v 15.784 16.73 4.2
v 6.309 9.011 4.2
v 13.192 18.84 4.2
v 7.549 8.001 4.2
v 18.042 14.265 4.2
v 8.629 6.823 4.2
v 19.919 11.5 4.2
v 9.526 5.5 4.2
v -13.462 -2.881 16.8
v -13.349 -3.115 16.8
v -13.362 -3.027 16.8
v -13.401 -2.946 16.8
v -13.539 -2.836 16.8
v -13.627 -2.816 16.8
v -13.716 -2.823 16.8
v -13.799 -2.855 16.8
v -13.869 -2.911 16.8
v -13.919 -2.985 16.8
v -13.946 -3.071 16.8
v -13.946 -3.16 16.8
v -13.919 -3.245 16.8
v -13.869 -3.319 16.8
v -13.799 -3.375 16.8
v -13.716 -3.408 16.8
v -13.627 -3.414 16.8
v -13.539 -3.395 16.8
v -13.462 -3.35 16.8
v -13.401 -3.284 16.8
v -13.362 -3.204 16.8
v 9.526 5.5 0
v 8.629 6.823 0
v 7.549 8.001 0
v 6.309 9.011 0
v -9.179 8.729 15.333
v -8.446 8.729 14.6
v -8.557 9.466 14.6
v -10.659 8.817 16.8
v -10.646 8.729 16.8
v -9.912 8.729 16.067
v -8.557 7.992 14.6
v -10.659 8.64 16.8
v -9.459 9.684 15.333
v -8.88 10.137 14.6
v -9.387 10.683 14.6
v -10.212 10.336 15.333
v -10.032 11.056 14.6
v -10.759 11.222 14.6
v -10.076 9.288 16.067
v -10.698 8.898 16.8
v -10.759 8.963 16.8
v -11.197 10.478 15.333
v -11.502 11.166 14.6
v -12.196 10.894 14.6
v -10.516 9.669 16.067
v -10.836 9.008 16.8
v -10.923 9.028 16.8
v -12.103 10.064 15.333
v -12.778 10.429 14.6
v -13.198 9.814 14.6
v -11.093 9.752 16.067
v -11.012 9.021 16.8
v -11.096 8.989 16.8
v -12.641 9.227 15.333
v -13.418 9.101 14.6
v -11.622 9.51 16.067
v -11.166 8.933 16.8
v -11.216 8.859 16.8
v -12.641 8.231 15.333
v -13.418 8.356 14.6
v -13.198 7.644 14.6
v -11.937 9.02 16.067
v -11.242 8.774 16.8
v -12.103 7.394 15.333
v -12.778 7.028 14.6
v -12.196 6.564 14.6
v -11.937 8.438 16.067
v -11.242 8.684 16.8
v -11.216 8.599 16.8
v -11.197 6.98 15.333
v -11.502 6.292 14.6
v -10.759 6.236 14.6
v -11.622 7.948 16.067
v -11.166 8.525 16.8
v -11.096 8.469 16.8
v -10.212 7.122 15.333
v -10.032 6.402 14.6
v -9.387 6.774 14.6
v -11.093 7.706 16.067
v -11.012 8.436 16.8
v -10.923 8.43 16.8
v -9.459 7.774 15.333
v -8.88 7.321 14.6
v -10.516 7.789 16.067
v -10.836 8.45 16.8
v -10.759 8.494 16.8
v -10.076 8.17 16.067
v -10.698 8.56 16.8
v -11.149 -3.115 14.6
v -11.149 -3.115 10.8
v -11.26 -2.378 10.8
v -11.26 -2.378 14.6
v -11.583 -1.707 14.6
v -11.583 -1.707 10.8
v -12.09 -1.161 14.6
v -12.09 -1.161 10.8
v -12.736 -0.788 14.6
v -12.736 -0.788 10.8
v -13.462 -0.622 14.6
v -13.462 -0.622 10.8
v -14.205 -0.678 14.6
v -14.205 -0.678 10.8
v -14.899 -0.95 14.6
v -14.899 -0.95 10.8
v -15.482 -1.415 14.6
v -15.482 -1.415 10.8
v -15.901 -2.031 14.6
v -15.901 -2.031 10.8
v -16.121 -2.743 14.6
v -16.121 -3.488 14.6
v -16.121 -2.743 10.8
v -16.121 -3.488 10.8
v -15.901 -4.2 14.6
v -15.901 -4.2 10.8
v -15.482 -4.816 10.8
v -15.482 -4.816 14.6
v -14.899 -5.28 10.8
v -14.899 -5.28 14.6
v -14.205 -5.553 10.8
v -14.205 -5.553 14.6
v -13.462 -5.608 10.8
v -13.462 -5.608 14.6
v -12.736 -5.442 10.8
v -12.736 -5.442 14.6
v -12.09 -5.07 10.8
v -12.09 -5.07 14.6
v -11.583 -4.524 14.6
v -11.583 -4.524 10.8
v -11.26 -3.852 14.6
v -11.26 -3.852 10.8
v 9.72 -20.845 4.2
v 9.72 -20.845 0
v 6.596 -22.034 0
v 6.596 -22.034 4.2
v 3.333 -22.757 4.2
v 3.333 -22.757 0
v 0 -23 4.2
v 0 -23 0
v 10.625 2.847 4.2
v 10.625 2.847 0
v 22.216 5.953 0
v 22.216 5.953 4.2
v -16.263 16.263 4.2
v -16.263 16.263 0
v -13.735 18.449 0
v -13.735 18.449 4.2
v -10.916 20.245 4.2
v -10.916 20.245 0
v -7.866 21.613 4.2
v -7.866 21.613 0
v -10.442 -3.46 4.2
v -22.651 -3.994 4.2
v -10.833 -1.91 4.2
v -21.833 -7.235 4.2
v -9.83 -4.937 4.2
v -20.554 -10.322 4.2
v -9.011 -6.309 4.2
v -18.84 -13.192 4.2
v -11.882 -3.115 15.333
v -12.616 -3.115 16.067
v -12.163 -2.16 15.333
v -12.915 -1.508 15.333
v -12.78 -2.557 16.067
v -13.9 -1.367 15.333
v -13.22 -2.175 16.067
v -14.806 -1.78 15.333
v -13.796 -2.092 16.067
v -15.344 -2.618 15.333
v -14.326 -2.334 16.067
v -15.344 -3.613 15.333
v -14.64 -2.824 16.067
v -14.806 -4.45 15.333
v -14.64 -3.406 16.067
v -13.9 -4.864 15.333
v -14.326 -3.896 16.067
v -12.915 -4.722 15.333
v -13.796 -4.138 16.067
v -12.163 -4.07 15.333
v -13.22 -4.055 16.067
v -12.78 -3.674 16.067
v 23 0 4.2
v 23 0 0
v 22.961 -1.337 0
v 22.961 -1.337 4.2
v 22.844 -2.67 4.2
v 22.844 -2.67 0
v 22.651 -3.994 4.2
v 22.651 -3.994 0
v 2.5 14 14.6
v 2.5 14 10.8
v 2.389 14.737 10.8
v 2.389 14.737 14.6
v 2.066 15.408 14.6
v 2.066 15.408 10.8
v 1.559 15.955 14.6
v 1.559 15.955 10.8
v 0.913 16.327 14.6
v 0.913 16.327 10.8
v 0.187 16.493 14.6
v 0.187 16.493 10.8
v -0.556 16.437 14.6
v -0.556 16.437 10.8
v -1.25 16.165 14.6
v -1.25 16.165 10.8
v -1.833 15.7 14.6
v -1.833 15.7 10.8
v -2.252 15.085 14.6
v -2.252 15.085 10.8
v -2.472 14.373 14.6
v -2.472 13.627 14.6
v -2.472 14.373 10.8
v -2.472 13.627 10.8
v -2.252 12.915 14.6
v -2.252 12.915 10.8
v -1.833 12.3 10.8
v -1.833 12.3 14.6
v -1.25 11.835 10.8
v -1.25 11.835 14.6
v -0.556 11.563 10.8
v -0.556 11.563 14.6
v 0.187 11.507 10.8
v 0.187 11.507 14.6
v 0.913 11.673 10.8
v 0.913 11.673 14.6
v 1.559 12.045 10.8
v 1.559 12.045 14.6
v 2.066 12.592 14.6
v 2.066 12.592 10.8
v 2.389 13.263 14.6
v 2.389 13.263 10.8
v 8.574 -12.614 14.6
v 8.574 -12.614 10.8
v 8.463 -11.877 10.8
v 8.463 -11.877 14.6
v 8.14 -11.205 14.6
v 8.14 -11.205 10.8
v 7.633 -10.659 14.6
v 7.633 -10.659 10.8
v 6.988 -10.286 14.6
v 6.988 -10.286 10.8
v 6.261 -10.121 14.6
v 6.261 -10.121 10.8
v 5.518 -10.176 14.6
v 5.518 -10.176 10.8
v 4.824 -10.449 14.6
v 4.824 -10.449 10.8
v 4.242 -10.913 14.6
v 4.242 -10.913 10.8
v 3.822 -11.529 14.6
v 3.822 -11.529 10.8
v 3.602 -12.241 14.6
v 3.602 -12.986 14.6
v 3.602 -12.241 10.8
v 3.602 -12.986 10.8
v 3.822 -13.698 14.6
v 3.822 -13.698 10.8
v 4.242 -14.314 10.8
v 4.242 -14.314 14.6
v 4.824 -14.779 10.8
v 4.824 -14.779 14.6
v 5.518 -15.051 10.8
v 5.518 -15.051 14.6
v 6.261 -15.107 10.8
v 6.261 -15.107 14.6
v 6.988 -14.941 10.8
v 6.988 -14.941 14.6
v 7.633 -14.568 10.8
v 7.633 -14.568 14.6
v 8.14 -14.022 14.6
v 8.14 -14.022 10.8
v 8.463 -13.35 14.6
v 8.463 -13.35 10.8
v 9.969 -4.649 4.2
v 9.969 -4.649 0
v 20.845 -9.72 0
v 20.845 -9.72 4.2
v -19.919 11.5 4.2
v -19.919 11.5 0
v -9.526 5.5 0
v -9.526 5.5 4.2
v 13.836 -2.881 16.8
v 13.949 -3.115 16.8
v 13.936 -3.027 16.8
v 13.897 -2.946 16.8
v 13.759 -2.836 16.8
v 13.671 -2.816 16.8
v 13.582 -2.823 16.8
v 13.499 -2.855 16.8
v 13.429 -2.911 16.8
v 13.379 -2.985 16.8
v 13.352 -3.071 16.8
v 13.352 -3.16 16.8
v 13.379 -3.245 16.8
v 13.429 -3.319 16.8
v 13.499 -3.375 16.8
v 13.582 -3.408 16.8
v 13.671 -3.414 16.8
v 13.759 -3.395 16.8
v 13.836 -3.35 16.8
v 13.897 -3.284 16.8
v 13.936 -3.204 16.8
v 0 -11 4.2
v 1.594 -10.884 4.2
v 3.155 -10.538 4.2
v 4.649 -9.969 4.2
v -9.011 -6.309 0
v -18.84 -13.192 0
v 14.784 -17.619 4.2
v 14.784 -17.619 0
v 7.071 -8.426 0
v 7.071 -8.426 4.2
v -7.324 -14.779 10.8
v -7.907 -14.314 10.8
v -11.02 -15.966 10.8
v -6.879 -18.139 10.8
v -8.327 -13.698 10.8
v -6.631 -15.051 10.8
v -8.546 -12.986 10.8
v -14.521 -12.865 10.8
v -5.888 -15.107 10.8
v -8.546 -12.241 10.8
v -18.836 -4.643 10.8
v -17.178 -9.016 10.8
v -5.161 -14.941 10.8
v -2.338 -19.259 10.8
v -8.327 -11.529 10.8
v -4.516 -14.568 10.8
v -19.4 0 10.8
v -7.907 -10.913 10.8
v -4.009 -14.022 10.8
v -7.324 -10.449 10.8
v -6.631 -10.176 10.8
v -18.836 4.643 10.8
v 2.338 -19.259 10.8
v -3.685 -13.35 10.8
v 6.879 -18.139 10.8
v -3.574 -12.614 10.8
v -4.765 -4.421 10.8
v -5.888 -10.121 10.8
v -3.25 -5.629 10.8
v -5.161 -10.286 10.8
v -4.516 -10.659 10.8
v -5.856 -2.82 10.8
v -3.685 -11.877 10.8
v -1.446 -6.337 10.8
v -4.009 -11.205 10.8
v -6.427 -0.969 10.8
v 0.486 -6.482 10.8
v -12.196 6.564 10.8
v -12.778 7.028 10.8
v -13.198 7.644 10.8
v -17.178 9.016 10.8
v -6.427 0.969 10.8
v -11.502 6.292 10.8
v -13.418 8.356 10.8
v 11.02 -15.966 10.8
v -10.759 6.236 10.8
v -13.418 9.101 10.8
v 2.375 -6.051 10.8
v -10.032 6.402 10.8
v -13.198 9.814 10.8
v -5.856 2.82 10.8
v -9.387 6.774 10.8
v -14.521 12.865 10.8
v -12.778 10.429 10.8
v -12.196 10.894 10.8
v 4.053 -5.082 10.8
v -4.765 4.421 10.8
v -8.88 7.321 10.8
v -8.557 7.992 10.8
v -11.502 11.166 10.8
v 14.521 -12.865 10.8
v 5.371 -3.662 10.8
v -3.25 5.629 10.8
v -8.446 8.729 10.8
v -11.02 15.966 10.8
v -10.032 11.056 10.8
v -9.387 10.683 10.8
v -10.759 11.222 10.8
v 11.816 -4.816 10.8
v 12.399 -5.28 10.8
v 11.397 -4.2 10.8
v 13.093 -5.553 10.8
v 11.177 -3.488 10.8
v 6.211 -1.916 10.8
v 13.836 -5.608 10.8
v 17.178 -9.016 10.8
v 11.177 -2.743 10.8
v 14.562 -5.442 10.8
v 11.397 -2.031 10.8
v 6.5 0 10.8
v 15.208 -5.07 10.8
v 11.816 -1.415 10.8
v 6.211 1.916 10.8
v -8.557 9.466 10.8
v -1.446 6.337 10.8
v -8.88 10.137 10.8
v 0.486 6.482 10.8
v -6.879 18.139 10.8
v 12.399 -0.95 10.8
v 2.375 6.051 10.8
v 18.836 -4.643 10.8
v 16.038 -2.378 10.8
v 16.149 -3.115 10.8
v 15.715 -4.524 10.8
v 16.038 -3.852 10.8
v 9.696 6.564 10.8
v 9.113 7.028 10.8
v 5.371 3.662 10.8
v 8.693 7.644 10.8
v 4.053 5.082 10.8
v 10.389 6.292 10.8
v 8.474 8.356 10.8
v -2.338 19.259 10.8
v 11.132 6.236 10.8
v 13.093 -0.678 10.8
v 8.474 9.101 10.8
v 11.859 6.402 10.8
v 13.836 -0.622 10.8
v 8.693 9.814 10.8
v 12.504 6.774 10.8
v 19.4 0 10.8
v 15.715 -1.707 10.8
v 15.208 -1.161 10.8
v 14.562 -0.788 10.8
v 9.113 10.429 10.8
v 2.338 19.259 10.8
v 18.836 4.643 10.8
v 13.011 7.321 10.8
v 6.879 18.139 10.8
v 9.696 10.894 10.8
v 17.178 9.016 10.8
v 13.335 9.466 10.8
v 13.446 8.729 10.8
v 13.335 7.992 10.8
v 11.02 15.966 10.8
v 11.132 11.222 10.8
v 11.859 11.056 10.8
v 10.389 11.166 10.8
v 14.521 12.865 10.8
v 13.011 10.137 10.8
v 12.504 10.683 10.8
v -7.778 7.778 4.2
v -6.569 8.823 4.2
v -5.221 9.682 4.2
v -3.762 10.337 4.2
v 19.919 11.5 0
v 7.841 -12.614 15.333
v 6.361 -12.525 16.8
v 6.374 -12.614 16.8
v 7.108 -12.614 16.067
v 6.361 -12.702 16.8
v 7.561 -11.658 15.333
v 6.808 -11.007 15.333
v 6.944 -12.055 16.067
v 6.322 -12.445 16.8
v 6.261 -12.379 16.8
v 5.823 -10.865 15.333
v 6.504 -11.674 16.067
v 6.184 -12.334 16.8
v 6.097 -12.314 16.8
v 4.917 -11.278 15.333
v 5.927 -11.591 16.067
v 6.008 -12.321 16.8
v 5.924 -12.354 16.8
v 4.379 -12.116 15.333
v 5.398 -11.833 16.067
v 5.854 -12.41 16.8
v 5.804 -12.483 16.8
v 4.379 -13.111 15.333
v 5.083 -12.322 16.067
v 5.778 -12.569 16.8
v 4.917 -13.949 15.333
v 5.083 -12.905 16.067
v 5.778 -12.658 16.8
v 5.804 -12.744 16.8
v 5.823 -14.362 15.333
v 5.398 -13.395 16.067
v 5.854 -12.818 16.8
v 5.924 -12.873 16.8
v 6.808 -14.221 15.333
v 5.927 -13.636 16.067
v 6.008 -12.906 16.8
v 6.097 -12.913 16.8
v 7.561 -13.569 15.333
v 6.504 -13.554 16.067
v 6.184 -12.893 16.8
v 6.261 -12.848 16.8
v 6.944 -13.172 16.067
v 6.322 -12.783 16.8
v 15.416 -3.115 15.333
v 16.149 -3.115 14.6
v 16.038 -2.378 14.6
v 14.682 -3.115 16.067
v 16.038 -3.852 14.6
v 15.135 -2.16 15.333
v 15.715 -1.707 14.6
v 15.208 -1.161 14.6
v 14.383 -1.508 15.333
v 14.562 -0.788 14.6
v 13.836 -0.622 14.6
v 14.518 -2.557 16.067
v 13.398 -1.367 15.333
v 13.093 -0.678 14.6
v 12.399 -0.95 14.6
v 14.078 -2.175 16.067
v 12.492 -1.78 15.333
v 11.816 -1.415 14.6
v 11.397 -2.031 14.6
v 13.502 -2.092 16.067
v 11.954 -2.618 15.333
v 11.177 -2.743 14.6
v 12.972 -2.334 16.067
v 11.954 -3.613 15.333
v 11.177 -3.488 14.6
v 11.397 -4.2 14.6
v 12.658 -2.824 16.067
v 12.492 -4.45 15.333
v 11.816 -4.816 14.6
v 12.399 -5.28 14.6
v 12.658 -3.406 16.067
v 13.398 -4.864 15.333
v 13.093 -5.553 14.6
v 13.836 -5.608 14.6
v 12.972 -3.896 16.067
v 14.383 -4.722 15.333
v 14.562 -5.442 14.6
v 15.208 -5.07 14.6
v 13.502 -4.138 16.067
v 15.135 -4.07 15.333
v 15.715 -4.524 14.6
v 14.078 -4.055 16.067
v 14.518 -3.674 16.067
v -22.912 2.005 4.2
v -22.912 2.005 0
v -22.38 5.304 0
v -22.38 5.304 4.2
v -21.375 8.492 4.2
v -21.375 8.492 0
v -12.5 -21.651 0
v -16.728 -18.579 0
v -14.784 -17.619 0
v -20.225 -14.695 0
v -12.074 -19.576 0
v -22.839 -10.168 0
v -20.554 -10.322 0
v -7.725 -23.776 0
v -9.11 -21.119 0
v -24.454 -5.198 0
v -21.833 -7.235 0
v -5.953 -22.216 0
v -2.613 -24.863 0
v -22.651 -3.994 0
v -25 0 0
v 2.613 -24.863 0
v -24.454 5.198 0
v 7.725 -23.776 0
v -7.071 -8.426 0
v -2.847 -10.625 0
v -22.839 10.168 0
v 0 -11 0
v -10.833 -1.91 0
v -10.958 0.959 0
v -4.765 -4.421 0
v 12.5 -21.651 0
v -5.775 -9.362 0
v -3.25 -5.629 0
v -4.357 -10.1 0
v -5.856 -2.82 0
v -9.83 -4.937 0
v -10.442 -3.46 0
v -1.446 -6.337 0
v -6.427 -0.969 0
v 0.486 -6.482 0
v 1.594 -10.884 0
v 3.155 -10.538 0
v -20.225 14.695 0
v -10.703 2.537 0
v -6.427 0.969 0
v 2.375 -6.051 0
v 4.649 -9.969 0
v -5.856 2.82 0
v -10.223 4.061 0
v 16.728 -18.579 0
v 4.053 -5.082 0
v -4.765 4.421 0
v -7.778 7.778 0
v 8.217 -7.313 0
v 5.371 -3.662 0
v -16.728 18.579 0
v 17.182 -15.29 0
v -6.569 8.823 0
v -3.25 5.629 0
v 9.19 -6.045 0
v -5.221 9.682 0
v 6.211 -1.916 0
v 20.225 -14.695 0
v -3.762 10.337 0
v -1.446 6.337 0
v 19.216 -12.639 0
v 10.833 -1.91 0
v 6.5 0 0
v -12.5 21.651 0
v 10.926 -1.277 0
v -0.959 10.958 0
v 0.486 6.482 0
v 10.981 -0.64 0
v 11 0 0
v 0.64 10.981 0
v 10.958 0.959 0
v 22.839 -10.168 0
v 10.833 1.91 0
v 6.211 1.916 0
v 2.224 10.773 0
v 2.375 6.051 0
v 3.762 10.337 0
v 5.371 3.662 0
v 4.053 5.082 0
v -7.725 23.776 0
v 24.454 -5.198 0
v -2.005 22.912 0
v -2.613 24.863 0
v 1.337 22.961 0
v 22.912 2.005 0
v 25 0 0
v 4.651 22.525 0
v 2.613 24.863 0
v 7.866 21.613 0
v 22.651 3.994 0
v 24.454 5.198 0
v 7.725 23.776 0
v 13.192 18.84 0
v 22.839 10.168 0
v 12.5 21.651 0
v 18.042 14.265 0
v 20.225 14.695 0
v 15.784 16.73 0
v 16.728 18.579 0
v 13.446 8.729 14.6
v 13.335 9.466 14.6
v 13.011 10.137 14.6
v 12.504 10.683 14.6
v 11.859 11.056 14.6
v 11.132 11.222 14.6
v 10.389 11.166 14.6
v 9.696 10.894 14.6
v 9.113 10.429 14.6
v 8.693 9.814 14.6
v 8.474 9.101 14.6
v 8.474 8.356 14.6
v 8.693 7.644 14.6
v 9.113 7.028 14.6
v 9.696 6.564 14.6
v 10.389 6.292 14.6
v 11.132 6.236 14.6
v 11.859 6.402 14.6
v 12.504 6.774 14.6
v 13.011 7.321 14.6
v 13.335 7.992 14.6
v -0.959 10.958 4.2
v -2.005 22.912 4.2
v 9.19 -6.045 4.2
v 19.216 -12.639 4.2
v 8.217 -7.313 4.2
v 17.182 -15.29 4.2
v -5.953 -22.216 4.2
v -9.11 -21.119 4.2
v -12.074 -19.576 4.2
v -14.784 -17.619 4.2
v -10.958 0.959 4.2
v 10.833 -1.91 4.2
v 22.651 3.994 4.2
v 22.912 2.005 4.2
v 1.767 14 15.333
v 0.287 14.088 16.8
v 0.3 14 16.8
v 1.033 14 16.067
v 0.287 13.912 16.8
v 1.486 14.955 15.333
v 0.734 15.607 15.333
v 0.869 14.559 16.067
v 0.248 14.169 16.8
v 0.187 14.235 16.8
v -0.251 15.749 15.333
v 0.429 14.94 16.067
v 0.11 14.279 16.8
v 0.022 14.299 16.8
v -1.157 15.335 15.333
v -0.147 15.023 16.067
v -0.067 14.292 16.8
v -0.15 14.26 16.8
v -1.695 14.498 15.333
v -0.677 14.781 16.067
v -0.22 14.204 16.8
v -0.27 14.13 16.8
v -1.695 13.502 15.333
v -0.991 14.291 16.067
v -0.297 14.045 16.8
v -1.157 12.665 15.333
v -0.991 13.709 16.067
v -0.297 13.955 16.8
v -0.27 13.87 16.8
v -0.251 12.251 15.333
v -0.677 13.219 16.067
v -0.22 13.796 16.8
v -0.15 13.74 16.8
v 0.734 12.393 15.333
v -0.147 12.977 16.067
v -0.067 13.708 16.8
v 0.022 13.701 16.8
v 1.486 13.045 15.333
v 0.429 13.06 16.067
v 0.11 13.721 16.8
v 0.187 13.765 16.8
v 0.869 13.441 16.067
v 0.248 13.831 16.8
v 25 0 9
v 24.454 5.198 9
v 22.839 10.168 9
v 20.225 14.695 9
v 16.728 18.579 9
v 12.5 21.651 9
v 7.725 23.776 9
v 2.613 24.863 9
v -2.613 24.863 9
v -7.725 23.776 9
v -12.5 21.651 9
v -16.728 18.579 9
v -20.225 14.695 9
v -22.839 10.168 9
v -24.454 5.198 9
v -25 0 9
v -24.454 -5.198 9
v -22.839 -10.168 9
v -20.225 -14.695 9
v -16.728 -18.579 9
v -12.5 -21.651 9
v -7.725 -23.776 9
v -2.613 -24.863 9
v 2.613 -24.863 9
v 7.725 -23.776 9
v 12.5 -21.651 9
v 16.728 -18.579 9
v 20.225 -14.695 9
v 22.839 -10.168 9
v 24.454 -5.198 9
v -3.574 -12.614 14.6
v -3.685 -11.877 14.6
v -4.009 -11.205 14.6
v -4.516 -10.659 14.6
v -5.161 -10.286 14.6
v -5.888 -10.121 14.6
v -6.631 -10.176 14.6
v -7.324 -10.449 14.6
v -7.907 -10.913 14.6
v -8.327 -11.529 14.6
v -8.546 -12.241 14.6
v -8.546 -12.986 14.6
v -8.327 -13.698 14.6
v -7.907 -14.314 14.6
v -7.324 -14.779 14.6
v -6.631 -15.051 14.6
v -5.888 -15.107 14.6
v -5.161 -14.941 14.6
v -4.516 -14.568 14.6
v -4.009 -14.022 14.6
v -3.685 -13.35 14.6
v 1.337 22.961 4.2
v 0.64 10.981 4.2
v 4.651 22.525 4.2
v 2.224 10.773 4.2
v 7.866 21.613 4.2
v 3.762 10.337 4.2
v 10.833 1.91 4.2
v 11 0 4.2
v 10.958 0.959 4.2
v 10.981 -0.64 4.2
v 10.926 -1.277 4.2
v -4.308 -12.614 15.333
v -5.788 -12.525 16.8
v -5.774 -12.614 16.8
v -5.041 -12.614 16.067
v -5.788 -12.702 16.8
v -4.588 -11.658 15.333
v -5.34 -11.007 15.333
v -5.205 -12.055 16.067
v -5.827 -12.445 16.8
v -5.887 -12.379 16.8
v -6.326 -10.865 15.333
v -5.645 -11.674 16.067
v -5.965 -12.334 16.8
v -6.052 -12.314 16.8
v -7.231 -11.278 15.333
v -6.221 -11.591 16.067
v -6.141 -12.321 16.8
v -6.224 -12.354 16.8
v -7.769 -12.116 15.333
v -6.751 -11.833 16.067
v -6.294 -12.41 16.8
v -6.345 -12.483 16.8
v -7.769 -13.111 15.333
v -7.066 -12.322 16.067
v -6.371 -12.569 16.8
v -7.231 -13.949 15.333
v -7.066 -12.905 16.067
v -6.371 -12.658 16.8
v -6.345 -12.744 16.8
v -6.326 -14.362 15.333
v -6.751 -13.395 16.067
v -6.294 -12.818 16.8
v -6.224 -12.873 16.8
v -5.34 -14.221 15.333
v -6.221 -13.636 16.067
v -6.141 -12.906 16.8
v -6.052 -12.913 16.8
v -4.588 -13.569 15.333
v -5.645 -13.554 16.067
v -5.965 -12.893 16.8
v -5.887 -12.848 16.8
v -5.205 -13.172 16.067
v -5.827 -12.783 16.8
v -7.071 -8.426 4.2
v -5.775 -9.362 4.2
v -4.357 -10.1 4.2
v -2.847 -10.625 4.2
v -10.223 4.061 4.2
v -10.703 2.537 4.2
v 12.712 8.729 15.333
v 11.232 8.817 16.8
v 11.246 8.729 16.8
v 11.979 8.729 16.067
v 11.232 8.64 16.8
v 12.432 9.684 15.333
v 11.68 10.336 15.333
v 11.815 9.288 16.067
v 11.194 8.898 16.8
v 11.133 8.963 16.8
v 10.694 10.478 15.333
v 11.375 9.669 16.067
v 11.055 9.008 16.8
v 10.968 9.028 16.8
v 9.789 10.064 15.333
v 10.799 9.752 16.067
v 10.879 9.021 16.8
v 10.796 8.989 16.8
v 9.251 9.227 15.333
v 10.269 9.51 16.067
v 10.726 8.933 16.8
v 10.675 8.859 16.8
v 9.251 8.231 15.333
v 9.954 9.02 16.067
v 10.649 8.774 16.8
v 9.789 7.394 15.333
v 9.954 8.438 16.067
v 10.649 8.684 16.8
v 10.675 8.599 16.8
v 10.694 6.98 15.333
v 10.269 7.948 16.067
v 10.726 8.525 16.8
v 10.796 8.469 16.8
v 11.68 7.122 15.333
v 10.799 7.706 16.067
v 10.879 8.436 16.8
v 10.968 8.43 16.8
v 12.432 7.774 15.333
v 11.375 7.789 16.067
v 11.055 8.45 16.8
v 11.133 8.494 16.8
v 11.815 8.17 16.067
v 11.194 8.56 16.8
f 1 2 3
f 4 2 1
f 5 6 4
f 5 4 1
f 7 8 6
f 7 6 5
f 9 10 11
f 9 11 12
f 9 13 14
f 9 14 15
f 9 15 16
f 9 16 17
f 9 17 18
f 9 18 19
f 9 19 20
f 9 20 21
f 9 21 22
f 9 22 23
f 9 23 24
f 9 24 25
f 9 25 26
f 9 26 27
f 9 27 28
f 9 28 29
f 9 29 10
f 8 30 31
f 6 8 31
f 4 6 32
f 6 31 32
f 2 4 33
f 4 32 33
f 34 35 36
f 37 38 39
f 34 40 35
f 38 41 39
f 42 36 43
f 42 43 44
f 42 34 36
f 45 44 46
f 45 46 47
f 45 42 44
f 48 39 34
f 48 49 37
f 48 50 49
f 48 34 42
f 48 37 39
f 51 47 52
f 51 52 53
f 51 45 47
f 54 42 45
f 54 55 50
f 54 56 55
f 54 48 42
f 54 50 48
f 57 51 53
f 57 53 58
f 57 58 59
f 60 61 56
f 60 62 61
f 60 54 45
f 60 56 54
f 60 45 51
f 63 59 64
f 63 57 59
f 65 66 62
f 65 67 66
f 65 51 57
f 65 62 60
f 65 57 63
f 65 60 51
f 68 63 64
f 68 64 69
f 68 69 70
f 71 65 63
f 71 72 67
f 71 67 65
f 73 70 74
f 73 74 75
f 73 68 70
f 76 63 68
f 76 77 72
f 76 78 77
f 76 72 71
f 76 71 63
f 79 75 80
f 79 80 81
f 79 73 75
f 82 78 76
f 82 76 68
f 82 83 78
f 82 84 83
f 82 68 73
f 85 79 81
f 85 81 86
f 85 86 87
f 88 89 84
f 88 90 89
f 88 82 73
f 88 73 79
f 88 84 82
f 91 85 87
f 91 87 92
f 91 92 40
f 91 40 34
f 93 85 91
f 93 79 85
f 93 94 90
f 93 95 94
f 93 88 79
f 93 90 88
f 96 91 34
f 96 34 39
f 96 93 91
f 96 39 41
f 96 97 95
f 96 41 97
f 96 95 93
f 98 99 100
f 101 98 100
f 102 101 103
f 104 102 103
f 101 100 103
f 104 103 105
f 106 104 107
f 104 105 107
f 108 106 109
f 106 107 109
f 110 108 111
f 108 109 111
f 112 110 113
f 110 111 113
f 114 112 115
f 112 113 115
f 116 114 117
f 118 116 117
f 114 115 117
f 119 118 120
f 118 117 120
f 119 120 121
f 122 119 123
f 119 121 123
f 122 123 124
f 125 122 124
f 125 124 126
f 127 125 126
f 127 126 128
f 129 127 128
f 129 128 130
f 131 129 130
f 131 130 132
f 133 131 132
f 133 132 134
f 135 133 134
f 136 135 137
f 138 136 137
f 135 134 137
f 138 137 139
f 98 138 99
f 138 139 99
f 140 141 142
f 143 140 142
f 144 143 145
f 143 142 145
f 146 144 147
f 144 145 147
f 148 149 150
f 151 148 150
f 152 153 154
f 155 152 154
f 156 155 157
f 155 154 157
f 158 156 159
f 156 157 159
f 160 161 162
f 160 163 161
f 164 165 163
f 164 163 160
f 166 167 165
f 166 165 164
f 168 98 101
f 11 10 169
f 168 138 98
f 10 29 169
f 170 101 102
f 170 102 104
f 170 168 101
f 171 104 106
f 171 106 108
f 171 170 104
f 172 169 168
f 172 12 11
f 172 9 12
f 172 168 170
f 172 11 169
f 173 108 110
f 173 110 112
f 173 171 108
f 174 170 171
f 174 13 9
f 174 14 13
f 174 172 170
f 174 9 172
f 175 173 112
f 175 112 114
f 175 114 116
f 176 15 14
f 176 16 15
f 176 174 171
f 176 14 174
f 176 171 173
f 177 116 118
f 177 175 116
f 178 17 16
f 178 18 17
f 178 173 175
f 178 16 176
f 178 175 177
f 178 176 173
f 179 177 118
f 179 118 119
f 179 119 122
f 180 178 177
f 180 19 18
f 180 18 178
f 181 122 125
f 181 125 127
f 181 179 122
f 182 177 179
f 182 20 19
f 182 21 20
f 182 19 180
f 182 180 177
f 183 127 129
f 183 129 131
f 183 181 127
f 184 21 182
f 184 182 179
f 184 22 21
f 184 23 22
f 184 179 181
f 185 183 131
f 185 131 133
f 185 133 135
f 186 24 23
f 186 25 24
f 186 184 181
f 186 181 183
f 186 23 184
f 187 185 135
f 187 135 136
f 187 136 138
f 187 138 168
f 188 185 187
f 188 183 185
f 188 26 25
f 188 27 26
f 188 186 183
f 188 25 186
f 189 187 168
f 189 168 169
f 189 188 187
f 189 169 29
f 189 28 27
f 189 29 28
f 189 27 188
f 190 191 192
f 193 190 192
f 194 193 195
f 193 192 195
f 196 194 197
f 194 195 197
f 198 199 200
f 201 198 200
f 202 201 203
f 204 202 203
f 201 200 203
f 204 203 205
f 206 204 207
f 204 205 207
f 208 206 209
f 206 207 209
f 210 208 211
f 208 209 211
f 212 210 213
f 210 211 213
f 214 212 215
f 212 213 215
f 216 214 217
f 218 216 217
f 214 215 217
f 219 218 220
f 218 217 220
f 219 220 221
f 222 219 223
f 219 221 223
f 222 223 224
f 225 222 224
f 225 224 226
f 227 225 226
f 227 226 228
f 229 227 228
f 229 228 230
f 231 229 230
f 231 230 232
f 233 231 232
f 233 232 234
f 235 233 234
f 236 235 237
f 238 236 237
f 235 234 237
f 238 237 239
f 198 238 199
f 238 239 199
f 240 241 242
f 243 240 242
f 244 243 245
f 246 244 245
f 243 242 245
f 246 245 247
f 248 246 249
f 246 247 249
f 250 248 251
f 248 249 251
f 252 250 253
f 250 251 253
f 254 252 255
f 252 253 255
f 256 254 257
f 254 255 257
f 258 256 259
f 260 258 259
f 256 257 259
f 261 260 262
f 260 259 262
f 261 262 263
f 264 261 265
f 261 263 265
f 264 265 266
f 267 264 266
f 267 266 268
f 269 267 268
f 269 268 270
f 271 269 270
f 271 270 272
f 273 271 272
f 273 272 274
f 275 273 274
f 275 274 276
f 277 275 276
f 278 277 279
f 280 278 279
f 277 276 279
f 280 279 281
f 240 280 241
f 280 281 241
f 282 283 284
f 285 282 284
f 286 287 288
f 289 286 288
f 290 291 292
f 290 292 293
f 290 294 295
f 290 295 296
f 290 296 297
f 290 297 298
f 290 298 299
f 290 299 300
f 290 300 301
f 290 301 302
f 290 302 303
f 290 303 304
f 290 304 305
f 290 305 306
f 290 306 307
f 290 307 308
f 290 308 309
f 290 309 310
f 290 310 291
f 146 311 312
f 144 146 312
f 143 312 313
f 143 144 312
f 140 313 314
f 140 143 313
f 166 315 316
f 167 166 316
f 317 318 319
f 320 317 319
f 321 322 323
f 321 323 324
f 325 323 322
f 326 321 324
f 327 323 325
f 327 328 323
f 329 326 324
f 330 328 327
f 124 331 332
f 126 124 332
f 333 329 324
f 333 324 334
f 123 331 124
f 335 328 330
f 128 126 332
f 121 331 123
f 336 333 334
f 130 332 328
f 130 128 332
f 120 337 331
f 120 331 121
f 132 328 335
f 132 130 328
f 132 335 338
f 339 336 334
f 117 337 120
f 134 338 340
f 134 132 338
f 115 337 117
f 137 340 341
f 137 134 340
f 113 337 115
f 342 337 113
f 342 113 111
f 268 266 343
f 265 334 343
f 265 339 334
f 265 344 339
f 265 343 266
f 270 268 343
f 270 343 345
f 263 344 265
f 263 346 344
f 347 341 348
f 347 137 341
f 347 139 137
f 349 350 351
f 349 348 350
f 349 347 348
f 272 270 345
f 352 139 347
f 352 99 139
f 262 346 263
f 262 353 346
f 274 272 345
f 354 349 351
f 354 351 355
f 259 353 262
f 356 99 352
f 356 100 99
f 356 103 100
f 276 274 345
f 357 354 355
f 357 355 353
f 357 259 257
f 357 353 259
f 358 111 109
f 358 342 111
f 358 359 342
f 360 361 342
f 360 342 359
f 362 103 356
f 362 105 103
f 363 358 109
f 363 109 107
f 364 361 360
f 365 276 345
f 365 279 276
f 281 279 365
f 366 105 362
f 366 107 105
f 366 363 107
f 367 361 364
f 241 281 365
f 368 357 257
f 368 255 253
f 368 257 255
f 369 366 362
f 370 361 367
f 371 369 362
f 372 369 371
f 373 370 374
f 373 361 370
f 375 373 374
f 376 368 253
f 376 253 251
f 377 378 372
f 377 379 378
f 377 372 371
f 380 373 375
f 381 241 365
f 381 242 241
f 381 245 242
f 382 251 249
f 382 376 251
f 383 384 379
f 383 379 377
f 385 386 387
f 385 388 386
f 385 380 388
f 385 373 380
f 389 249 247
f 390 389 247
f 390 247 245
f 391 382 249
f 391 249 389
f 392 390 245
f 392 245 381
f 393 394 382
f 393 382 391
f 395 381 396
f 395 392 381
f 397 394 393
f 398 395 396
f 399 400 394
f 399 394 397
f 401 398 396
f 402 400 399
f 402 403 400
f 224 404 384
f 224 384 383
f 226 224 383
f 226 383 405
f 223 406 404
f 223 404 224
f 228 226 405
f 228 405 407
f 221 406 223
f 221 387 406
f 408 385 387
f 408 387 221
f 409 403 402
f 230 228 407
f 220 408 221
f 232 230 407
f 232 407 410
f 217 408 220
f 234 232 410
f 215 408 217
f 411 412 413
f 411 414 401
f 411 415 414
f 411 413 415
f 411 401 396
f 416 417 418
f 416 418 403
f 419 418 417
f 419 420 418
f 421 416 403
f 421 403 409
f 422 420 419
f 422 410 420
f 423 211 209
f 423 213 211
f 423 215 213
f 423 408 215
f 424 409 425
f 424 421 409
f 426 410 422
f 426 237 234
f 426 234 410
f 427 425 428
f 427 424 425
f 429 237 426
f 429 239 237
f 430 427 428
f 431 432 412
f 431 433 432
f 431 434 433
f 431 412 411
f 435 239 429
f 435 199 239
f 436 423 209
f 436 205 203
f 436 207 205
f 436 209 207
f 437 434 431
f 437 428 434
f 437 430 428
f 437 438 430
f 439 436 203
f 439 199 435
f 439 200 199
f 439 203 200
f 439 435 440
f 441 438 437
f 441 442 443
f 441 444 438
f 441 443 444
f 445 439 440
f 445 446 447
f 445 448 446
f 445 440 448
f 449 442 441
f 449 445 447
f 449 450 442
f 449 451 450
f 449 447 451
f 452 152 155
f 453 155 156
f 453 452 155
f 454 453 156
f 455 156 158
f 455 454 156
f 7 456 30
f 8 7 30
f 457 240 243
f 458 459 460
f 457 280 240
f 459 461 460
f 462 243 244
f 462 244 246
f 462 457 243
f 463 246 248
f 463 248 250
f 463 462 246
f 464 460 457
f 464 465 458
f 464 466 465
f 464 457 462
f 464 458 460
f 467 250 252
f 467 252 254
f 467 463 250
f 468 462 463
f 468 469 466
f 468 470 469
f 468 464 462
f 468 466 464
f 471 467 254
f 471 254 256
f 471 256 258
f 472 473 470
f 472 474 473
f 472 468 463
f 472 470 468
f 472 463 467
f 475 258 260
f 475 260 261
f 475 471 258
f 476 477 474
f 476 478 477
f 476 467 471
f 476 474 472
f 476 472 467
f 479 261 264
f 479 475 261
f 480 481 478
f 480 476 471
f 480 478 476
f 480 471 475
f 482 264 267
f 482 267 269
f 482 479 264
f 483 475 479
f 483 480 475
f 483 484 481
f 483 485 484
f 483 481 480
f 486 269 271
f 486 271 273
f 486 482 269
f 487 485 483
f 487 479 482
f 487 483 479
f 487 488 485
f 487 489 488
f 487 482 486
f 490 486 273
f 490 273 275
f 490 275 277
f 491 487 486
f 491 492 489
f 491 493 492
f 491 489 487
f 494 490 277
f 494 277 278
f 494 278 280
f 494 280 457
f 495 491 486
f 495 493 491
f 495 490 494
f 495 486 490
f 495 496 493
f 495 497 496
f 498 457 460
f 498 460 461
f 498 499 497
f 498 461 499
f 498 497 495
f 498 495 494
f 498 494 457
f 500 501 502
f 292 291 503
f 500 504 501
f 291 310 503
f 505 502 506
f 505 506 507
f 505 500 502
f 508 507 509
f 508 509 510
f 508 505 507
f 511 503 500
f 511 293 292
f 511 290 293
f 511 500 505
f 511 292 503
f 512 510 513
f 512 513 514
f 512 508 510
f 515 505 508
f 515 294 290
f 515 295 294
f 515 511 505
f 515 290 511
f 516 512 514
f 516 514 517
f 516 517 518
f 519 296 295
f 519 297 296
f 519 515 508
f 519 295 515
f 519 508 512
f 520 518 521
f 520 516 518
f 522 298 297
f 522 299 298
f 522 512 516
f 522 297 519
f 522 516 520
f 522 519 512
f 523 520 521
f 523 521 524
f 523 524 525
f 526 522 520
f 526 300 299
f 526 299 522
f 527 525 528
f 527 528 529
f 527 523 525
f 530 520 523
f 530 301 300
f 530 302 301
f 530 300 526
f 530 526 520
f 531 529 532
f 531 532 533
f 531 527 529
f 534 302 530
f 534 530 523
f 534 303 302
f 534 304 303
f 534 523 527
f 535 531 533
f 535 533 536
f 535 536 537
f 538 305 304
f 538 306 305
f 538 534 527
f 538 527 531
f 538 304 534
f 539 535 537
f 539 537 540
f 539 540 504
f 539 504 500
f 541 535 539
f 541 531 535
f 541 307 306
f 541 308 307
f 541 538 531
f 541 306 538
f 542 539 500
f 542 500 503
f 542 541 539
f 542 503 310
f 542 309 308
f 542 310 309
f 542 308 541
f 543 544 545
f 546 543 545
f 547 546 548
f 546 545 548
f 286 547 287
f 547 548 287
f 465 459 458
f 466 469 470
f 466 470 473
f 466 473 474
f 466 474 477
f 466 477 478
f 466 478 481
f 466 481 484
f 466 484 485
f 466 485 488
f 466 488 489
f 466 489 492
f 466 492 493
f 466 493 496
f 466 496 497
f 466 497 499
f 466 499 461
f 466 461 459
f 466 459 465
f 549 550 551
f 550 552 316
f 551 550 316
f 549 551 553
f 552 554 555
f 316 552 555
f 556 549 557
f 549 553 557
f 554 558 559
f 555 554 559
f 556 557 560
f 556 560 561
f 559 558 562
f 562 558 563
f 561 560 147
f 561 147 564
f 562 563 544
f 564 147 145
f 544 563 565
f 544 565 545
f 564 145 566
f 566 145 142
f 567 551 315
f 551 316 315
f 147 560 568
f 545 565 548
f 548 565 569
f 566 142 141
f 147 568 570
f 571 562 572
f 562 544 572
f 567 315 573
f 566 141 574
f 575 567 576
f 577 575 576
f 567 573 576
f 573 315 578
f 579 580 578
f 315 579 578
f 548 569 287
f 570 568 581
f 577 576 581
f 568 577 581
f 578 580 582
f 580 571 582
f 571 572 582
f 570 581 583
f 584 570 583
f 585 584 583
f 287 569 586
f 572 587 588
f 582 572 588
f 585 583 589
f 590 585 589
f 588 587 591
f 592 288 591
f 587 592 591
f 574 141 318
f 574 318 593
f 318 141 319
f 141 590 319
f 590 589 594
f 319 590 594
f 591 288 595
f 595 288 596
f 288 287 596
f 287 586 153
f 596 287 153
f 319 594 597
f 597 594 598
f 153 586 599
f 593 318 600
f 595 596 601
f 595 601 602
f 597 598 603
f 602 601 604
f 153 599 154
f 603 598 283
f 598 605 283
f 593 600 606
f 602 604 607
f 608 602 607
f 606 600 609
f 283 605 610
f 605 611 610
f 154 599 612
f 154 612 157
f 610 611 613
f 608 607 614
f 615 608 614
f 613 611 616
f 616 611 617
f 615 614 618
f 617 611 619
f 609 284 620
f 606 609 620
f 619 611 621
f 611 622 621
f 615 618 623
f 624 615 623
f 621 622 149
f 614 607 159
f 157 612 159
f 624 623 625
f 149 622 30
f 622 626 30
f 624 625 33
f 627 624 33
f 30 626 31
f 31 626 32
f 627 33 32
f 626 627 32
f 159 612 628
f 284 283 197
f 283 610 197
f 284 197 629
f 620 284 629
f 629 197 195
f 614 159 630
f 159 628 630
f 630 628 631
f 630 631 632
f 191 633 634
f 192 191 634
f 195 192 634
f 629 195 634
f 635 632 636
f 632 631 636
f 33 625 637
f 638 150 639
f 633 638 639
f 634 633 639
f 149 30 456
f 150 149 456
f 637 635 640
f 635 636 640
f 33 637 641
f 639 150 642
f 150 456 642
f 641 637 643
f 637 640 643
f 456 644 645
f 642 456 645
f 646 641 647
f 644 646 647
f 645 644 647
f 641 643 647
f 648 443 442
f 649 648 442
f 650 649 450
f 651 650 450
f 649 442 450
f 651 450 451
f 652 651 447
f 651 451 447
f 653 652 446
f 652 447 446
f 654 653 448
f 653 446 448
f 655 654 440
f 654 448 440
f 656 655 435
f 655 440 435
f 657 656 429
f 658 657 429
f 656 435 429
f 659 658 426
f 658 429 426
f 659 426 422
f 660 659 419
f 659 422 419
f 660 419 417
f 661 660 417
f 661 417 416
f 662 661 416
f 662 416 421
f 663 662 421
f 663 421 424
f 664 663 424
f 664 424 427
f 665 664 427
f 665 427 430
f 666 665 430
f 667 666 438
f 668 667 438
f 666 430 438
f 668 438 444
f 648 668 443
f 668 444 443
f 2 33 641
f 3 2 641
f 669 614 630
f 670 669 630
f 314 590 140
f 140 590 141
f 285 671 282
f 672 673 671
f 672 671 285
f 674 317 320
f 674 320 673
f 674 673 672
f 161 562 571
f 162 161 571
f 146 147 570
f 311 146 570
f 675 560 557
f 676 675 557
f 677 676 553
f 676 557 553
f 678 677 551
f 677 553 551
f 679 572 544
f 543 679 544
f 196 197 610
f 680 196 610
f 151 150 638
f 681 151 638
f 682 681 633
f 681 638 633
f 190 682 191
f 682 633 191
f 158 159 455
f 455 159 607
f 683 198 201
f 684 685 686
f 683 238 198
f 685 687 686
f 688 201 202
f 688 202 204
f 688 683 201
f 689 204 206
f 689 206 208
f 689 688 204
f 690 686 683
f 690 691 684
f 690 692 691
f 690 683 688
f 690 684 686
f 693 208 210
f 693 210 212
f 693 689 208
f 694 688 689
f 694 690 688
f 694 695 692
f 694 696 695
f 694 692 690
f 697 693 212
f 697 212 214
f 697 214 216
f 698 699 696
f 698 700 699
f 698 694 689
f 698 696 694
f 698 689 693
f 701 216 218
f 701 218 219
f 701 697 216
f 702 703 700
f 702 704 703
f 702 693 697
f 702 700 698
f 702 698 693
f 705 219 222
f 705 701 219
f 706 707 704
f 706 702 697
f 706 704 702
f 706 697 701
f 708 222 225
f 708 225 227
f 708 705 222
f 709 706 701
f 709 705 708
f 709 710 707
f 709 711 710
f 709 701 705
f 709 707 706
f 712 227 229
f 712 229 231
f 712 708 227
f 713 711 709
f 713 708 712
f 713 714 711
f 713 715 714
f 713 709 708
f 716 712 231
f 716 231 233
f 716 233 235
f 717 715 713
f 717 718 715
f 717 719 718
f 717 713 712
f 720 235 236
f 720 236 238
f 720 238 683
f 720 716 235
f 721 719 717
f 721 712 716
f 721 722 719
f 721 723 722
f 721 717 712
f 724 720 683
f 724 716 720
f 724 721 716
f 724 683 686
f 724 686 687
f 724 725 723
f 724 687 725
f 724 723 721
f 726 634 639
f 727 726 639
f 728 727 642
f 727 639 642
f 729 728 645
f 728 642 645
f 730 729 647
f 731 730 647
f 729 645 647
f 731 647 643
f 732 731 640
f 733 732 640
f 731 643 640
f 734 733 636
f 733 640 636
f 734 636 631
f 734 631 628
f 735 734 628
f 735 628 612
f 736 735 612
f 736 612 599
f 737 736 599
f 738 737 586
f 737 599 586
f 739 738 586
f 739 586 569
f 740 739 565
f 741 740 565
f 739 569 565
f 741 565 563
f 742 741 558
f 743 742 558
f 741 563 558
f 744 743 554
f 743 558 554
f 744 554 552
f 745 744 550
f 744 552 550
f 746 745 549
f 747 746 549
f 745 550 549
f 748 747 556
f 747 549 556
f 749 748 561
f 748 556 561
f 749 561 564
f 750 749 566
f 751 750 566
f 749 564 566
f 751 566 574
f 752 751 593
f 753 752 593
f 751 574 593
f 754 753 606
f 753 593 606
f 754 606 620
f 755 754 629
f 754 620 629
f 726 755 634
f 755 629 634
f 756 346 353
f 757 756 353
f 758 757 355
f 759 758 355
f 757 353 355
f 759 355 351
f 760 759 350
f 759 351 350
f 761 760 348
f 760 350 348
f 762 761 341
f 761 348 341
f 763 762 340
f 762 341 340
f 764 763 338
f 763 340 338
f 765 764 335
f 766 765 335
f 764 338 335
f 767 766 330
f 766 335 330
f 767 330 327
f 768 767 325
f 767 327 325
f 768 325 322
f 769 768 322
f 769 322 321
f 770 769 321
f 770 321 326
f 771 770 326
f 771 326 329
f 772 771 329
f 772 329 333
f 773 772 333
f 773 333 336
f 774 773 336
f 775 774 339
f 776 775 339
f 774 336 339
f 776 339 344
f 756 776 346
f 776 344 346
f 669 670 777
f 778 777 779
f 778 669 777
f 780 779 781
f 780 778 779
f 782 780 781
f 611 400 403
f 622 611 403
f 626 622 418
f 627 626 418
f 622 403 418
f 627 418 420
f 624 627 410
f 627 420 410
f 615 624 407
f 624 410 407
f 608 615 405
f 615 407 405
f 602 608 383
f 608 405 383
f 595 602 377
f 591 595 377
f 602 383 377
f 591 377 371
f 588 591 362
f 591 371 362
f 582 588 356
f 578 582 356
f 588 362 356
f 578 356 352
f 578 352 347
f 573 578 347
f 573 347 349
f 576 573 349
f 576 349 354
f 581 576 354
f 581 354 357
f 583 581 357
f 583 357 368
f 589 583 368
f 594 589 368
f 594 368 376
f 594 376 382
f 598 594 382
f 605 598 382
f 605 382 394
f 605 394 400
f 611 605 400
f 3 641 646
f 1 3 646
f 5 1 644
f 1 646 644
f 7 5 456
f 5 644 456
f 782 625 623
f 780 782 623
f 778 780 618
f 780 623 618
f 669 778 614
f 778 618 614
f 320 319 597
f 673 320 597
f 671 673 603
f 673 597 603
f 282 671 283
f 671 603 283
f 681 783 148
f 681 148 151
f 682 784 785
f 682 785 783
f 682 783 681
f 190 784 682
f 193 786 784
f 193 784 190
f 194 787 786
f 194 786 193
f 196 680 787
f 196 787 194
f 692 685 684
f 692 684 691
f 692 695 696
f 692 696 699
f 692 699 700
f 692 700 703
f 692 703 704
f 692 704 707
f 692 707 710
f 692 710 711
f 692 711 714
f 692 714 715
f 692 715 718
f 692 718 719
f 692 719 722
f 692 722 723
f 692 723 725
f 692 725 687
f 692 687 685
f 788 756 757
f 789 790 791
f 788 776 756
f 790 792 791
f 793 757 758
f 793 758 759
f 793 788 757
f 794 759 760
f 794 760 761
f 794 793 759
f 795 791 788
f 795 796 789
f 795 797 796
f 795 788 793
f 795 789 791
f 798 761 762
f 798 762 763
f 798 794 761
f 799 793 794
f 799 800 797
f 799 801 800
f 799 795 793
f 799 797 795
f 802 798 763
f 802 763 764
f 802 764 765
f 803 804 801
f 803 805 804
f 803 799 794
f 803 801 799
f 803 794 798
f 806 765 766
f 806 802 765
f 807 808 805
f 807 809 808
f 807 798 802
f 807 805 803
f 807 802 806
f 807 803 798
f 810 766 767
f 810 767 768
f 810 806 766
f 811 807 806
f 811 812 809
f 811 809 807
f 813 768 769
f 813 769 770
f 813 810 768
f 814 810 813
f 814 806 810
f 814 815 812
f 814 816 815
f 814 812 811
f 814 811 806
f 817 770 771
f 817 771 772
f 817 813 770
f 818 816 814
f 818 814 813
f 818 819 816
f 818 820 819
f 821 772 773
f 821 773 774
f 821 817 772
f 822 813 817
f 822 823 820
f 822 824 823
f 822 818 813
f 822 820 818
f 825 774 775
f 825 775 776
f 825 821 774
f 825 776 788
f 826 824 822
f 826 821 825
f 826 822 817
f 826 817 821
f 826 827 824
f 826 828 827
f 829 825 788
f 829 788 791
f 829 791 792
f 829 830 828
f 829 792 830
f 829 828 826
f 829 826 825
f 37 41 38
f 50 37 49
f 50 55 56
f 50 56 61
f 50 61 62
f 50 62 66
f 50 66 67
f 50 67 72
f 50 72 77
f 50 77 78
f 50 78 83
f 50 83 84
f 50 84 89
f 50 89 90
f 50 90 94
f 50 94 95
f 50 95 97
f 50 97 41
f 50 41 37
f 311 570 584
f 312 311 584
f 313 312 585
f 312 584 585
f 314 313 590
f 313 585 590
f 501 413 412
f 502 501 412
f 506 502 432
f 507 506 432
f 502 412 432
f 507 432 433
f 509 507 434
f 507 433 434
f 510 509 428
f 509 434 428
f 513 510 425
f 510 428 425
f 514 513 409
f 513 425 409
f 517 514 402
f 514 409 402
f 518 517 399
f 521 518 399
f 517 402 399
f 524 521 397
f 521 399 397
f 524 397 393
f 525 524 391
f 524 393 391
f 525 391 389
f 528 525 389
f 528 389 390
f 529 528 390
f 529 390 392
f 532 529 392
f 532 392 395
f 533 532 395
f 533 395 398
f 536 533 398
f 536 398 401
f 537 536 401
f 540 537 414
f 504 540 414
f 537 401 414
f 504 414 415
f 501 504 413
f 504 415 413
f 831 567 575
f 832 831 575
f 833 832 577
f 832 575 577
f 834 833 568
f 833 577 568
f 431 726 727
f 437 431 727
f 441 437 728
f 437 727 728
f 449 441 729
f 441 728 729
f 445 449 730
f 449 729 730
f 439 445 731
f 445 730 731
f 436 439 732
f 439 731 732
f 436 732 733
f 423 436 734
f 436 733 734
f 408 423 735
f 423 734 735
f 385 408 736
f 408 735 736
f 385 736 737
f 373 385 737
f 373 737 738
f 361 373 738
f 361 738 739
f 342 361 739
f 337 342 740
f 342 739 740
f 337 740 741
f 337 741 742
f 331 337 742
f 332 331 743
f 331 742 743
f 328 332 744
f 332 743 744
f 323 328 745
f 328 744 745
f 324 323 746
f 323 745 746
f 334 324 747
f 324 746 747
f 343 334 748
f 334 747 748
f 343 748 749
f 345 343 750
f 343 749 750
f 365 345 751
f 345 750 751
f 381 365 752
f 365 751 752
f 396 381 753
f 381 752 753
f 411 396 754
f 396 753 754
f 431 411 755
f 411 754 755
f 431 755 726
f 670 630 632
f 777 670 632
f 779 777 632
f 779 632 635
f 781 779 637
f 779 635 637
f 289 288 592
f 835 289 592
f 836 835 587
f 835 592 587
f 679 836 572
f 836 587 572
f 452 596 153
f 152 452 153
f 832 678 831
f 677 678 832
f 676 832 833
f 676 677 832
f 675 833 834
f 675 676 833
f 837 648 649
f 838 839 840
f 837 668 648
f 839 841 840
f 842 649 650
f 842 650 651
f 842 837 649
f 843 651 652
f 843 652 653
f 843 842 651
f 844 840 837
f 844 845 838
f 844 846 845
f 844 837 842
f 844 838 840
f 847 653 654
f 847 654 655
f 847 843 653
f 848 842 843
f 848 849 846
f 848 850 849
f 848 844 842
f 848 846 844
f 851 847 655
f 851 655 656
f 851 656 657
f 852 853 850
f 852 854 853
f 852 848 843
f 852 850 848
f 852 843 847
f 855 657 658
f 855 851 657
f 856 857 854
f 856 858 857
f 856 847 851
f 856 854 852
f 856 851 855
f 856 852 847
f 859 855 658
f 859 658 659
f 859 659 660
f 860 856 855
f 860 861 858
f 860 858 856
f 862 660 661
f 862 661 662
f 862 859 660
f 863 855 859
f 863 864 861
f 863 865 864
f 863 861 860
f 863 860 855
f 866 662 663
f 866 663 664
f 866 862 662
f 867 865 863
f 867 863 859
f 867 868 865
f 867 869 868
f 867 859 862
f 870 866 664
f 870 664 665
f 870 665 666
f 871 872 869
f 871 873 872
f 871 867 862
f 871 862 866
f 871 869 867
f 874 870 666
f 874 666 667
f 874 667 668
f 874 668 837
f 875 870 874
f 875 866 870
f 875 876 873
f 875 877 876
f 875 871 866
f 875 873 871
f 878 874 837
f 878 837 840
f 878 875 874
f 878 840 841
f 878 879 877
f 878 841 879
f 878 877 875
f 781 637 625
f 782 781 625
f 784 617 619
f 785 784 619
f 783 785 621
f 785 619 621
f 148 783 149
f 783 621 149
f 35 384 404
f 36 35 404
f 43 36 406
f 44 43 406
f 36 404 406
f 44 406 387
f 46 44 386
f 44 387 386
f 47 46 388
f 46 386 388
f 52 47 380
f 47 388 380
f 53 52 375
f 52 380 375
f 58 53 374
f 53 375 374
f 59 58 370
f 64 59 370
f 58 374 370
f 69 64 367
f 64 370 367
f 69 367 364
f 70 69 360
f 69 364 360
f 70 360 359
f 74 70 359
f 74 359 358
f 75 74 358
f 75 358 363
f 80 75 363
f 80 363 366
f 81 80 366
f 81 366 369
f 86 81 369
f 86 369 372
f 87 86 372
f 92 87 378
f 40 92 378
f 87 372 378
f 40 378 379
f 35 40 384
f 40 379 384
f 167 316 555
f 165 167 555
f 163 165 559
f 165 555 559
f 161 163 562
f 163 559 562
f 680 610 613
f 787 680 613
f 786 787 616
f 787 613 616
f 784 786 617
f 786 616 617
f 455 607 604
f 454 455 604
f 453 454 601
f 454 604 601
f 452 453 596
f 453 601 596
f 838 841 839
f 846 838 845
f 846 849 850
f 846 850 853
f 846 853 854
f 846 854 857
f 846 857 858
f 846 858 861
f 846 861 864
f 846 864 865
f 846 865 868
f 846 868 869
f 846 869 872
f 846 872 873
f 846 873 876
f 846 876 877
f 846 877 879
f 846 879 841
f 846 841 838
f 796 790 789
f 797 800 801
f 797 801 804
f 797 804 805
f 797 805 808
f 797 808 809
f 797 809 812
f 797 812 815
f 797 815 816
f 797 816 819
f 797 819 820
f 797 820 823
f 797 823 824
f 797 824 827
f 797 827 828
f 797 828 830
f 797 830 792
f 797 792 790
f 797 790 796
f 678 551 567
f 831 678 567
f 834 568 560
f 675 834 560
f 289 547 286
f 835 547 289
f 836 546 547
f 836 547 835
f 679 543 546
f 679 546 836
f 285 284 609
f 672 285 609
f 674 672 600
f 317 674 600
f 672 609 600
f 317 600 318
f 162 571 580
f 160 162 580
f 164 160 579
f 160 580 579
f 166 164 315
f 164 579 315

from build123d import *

# Parameters (mm, degrees)
F0_R     = 25
F1_DEPTH = 10.8
F2_SIZE2 = 1.8
F2_SIZE  = 5.6
F3_R     = 2.5
F4_DEPTH = 6
F5_SIZE  = 2.2
F3_R_2   = 6.5
F6_DEPTH = 10.801
F8_DEPTH = 4.2


with BuildPart() as f1:
    # F0 (on Top) → F1 (new body)
    with BuildSketch(Plane.XY):
        Circle(F0_R)
    extrude(amount=F1_DEPTH)

    # F2
    f2_edges = [f1.edges().sort_by_distance(p)[0] for p in [
        (-25, 0, 10.8),
    ]]
    f2_side = f1.faces().sort_by_distance((0, 0, 10.8))[0]
    chamfer(f2_edges, length=F2_SIZE, length2=F2_SIZE2, reference=f2_side)

    # F3 (on face) → F4 (join)
    with BuildSketch(Plane.XY.offset(10.8)):
        with Locations((-10.9456407546, 8.728857226)):
            Circle(F3_R)
        with Locations((0, 14)):
            Circle(F3_R)
        with Locations((10.9456407546, 8.728857226)):
            Circle(F3_R)
        with Locations((13.6489907705, -3.1152930754)):
            Circle(F3_R)
        with Locations((6.0743723476, -12.6135641506)):
            Circle(F3_R)
        with Locations((-6.0743723476, -12.6135641506)):
            Circle(F3_R)
        with Locations((-13.6489907705, -3.1152930754)):
            Circle(F3_R)
    extrude(amount=F4_DEPTH)

    # F5
    f5_edges = [f1.edges().sort_by_distance(p)[0] for p in [
        (-2.5, 14, 16.8),
        (8.445641, 8.728857, 16.8),
        (11.148991, -3.115293, 16.8),
        (3.574372, -12.613564, 16.8),
        (-8.574372, -12.613564, 16.8),
        (-16.148991, -3.115293, 16.8),
        (-13.445641, 8.728857, 16.8),
    ]]
    chamfer(f5_edges, length=F5_SIZE)

    # F3 (on face) → F6 (cut, through all)
    with BuildSketch(Plane.XY.offset(10.8)):
        Circle(F3_R_2)
    extrude(amount=-F6_DEPTH, mode=Mode.SUBTRACT)

    # F7 (on face) → F8 (cut)
    with BuildSketch(Plane(origin=(0, 0, 0), x_dir=(1, 0, 0), z_dir=(0, 0, -1))):
        with BuildLine():
            Line((4.6488008791, 9.9693856574), (9.72022002, 20.8450791018))
            ThreePointArc((9.72022002, 20.8450791018), (4.9781111206, 22.4548081638), (0, 23))
            Line((0, 23), (0, 11))
            ThreePointArc((0, 11), (2.3808357533, 10.7392560783), (4.6488008791, 9.9693856574))
        make_face()
        with BuildLine():
            Line((9.9693856574, 4.6488008791), (20.8450791018, 9.72022002))
            ThreePointArc((20.8450791018, 9.72022002), (18.2471268267, 14.0015128672), (14.7841150228, 17.6190221917))
            Line((14.7841150228, 17.6190221917), (7.0706637066, 8.4264888743))
            ThreePointArc((7.0706637066, 8.4264888743), (8.7268867432, 6.6963757191), (9.9693856574, 4.6488008791))
        make_face()
        with BuildLine():
            ThreePointArc((22.2162940046, -5.9528380374), (22.8032318116, -3.0021024211), (23, 0))
            ThreePointArc((23, 0), (22.9124780561, 2.0045820832), (22.6505783193, 3.9939080863))
            Line((22.6505783193, 3.9939080863), (10.8328852831, 1.9101299543))
            ThreePointArc((10.8328852831, 1.9101299543), (10.958141679, 0.9587131702), (11, 0))
            ThreePointArc((11, 0), (10.9058934751, -1.4357881144), (10.6251840892, -2.8470094961))
            Line((10.6251840892, -2.8470094961), (22.2162940046, -5.9528380374))
        make_face()
        with BuildLine():
            ThreePointArc((13.1922580361, -18.8404970186), (16.9573787466, -15.5385747752), (19.918584287, -11.5))
            Line((19.918584287, -11.5), (9.5262794416, -5.5))
            ThreePointArc((9.5262794416, -5.5), (8.1100507049, -7.4314922838), (6.3093407999, -9.0106724872))
            Line((6.3093407999, -9.0106724872), (13.1922580361, -18.8404970186))
        make_face()
        with BuildLine():
            ThreePointArc((-2.0045820832, -22.9124780561), (3.0021024211, -22.8032318116), (7.8664632965, -21.6129302781))
            Line((7.8664632965, -21.6129302781), (3.7622215766, -10.3366188286))
            ThreePointArc((3.7622215766, -10.3366188286), (1.4357881144, -10.9058934751), (-0.9587131702, -10.958141679))
            Line((-0.9587131702, -10.958141679), (-2.0045820832, -22.9124780561))
        make_face()
        with BuildLine():
            Line((-7.8664632965, -21.6129302781), (-3.7622215766, -10.3366188286))
            ThreePointArc((-3.7622215766, -10.3366188286), (-5.9102956918, -9.2773059039), (-7.7781745931, -7.7781745931))
            Line((-7.7781745931, -7.7781745931), (-16.2634559673, -16.2634559673))
            ThreePointArc((-16.2634559673, -16.2634559673), (-12.357890992, -19.3980032537), (-7.8664632965, -21.6129302781))
        make_face()
        with BuildLine():
            Line((-19.918584287, -11.5), (-9.5262794416, -5.5))
            ThreePointArc((-9.5262794416, -5.5), (-10.4908864582, -3.3077637945), (-10.958141679, -0.9587131702))
            Line((-10.958141679, -0.9587131702), (-22.9124780561, -2.0045820832))
            ThreePointArc((-22.9124780561, -2.0045820832), (-21.9354898672, -6.9162333886), (-19.918584287, -11.5))
        make_face()
        with BuildLine():
            Line((-22.6505783193, 3.9939080863), (-10.8328852831, 1.9101299543))
            ThreePointArc((-10.8328852831, 1.9101299543), (-10.1626748576, 4.209517756), (-9.0106724872, 6.3093407999))
            Line((-9.0106724872, 6.3093407999), (-18.8404970186, 13.1922580361))
            ThreePointArc((-18.8404970186, 13.1922580361), (-21.2492292478, 8.8017189444), (-22.6505783193, 3.9939080863))
        make_face()
        with BuildLine():
            Line((-2.8470094961, 10.6251840892), (-5.9528380374, 22.2162940046))
            ThreePointArc((-5.9528380374, 22.2162940046), (-10.6202181044, 20.4012491631), (-14.7841150228, 17.6190221917))
            Line((-14.7841150228, 17.6190221917), (-7.0706637066, 8.4264888743))
            ThreePointArc((-7.0706637066, 8.4264888743), (-5.0792347456, 9.757119165), (-2.8470094961, 10.6251840892))
        make_face()
    extrude(amount=-F8_DEPTH, mode=Mode.SUBTRACT)


solid = f1.part
